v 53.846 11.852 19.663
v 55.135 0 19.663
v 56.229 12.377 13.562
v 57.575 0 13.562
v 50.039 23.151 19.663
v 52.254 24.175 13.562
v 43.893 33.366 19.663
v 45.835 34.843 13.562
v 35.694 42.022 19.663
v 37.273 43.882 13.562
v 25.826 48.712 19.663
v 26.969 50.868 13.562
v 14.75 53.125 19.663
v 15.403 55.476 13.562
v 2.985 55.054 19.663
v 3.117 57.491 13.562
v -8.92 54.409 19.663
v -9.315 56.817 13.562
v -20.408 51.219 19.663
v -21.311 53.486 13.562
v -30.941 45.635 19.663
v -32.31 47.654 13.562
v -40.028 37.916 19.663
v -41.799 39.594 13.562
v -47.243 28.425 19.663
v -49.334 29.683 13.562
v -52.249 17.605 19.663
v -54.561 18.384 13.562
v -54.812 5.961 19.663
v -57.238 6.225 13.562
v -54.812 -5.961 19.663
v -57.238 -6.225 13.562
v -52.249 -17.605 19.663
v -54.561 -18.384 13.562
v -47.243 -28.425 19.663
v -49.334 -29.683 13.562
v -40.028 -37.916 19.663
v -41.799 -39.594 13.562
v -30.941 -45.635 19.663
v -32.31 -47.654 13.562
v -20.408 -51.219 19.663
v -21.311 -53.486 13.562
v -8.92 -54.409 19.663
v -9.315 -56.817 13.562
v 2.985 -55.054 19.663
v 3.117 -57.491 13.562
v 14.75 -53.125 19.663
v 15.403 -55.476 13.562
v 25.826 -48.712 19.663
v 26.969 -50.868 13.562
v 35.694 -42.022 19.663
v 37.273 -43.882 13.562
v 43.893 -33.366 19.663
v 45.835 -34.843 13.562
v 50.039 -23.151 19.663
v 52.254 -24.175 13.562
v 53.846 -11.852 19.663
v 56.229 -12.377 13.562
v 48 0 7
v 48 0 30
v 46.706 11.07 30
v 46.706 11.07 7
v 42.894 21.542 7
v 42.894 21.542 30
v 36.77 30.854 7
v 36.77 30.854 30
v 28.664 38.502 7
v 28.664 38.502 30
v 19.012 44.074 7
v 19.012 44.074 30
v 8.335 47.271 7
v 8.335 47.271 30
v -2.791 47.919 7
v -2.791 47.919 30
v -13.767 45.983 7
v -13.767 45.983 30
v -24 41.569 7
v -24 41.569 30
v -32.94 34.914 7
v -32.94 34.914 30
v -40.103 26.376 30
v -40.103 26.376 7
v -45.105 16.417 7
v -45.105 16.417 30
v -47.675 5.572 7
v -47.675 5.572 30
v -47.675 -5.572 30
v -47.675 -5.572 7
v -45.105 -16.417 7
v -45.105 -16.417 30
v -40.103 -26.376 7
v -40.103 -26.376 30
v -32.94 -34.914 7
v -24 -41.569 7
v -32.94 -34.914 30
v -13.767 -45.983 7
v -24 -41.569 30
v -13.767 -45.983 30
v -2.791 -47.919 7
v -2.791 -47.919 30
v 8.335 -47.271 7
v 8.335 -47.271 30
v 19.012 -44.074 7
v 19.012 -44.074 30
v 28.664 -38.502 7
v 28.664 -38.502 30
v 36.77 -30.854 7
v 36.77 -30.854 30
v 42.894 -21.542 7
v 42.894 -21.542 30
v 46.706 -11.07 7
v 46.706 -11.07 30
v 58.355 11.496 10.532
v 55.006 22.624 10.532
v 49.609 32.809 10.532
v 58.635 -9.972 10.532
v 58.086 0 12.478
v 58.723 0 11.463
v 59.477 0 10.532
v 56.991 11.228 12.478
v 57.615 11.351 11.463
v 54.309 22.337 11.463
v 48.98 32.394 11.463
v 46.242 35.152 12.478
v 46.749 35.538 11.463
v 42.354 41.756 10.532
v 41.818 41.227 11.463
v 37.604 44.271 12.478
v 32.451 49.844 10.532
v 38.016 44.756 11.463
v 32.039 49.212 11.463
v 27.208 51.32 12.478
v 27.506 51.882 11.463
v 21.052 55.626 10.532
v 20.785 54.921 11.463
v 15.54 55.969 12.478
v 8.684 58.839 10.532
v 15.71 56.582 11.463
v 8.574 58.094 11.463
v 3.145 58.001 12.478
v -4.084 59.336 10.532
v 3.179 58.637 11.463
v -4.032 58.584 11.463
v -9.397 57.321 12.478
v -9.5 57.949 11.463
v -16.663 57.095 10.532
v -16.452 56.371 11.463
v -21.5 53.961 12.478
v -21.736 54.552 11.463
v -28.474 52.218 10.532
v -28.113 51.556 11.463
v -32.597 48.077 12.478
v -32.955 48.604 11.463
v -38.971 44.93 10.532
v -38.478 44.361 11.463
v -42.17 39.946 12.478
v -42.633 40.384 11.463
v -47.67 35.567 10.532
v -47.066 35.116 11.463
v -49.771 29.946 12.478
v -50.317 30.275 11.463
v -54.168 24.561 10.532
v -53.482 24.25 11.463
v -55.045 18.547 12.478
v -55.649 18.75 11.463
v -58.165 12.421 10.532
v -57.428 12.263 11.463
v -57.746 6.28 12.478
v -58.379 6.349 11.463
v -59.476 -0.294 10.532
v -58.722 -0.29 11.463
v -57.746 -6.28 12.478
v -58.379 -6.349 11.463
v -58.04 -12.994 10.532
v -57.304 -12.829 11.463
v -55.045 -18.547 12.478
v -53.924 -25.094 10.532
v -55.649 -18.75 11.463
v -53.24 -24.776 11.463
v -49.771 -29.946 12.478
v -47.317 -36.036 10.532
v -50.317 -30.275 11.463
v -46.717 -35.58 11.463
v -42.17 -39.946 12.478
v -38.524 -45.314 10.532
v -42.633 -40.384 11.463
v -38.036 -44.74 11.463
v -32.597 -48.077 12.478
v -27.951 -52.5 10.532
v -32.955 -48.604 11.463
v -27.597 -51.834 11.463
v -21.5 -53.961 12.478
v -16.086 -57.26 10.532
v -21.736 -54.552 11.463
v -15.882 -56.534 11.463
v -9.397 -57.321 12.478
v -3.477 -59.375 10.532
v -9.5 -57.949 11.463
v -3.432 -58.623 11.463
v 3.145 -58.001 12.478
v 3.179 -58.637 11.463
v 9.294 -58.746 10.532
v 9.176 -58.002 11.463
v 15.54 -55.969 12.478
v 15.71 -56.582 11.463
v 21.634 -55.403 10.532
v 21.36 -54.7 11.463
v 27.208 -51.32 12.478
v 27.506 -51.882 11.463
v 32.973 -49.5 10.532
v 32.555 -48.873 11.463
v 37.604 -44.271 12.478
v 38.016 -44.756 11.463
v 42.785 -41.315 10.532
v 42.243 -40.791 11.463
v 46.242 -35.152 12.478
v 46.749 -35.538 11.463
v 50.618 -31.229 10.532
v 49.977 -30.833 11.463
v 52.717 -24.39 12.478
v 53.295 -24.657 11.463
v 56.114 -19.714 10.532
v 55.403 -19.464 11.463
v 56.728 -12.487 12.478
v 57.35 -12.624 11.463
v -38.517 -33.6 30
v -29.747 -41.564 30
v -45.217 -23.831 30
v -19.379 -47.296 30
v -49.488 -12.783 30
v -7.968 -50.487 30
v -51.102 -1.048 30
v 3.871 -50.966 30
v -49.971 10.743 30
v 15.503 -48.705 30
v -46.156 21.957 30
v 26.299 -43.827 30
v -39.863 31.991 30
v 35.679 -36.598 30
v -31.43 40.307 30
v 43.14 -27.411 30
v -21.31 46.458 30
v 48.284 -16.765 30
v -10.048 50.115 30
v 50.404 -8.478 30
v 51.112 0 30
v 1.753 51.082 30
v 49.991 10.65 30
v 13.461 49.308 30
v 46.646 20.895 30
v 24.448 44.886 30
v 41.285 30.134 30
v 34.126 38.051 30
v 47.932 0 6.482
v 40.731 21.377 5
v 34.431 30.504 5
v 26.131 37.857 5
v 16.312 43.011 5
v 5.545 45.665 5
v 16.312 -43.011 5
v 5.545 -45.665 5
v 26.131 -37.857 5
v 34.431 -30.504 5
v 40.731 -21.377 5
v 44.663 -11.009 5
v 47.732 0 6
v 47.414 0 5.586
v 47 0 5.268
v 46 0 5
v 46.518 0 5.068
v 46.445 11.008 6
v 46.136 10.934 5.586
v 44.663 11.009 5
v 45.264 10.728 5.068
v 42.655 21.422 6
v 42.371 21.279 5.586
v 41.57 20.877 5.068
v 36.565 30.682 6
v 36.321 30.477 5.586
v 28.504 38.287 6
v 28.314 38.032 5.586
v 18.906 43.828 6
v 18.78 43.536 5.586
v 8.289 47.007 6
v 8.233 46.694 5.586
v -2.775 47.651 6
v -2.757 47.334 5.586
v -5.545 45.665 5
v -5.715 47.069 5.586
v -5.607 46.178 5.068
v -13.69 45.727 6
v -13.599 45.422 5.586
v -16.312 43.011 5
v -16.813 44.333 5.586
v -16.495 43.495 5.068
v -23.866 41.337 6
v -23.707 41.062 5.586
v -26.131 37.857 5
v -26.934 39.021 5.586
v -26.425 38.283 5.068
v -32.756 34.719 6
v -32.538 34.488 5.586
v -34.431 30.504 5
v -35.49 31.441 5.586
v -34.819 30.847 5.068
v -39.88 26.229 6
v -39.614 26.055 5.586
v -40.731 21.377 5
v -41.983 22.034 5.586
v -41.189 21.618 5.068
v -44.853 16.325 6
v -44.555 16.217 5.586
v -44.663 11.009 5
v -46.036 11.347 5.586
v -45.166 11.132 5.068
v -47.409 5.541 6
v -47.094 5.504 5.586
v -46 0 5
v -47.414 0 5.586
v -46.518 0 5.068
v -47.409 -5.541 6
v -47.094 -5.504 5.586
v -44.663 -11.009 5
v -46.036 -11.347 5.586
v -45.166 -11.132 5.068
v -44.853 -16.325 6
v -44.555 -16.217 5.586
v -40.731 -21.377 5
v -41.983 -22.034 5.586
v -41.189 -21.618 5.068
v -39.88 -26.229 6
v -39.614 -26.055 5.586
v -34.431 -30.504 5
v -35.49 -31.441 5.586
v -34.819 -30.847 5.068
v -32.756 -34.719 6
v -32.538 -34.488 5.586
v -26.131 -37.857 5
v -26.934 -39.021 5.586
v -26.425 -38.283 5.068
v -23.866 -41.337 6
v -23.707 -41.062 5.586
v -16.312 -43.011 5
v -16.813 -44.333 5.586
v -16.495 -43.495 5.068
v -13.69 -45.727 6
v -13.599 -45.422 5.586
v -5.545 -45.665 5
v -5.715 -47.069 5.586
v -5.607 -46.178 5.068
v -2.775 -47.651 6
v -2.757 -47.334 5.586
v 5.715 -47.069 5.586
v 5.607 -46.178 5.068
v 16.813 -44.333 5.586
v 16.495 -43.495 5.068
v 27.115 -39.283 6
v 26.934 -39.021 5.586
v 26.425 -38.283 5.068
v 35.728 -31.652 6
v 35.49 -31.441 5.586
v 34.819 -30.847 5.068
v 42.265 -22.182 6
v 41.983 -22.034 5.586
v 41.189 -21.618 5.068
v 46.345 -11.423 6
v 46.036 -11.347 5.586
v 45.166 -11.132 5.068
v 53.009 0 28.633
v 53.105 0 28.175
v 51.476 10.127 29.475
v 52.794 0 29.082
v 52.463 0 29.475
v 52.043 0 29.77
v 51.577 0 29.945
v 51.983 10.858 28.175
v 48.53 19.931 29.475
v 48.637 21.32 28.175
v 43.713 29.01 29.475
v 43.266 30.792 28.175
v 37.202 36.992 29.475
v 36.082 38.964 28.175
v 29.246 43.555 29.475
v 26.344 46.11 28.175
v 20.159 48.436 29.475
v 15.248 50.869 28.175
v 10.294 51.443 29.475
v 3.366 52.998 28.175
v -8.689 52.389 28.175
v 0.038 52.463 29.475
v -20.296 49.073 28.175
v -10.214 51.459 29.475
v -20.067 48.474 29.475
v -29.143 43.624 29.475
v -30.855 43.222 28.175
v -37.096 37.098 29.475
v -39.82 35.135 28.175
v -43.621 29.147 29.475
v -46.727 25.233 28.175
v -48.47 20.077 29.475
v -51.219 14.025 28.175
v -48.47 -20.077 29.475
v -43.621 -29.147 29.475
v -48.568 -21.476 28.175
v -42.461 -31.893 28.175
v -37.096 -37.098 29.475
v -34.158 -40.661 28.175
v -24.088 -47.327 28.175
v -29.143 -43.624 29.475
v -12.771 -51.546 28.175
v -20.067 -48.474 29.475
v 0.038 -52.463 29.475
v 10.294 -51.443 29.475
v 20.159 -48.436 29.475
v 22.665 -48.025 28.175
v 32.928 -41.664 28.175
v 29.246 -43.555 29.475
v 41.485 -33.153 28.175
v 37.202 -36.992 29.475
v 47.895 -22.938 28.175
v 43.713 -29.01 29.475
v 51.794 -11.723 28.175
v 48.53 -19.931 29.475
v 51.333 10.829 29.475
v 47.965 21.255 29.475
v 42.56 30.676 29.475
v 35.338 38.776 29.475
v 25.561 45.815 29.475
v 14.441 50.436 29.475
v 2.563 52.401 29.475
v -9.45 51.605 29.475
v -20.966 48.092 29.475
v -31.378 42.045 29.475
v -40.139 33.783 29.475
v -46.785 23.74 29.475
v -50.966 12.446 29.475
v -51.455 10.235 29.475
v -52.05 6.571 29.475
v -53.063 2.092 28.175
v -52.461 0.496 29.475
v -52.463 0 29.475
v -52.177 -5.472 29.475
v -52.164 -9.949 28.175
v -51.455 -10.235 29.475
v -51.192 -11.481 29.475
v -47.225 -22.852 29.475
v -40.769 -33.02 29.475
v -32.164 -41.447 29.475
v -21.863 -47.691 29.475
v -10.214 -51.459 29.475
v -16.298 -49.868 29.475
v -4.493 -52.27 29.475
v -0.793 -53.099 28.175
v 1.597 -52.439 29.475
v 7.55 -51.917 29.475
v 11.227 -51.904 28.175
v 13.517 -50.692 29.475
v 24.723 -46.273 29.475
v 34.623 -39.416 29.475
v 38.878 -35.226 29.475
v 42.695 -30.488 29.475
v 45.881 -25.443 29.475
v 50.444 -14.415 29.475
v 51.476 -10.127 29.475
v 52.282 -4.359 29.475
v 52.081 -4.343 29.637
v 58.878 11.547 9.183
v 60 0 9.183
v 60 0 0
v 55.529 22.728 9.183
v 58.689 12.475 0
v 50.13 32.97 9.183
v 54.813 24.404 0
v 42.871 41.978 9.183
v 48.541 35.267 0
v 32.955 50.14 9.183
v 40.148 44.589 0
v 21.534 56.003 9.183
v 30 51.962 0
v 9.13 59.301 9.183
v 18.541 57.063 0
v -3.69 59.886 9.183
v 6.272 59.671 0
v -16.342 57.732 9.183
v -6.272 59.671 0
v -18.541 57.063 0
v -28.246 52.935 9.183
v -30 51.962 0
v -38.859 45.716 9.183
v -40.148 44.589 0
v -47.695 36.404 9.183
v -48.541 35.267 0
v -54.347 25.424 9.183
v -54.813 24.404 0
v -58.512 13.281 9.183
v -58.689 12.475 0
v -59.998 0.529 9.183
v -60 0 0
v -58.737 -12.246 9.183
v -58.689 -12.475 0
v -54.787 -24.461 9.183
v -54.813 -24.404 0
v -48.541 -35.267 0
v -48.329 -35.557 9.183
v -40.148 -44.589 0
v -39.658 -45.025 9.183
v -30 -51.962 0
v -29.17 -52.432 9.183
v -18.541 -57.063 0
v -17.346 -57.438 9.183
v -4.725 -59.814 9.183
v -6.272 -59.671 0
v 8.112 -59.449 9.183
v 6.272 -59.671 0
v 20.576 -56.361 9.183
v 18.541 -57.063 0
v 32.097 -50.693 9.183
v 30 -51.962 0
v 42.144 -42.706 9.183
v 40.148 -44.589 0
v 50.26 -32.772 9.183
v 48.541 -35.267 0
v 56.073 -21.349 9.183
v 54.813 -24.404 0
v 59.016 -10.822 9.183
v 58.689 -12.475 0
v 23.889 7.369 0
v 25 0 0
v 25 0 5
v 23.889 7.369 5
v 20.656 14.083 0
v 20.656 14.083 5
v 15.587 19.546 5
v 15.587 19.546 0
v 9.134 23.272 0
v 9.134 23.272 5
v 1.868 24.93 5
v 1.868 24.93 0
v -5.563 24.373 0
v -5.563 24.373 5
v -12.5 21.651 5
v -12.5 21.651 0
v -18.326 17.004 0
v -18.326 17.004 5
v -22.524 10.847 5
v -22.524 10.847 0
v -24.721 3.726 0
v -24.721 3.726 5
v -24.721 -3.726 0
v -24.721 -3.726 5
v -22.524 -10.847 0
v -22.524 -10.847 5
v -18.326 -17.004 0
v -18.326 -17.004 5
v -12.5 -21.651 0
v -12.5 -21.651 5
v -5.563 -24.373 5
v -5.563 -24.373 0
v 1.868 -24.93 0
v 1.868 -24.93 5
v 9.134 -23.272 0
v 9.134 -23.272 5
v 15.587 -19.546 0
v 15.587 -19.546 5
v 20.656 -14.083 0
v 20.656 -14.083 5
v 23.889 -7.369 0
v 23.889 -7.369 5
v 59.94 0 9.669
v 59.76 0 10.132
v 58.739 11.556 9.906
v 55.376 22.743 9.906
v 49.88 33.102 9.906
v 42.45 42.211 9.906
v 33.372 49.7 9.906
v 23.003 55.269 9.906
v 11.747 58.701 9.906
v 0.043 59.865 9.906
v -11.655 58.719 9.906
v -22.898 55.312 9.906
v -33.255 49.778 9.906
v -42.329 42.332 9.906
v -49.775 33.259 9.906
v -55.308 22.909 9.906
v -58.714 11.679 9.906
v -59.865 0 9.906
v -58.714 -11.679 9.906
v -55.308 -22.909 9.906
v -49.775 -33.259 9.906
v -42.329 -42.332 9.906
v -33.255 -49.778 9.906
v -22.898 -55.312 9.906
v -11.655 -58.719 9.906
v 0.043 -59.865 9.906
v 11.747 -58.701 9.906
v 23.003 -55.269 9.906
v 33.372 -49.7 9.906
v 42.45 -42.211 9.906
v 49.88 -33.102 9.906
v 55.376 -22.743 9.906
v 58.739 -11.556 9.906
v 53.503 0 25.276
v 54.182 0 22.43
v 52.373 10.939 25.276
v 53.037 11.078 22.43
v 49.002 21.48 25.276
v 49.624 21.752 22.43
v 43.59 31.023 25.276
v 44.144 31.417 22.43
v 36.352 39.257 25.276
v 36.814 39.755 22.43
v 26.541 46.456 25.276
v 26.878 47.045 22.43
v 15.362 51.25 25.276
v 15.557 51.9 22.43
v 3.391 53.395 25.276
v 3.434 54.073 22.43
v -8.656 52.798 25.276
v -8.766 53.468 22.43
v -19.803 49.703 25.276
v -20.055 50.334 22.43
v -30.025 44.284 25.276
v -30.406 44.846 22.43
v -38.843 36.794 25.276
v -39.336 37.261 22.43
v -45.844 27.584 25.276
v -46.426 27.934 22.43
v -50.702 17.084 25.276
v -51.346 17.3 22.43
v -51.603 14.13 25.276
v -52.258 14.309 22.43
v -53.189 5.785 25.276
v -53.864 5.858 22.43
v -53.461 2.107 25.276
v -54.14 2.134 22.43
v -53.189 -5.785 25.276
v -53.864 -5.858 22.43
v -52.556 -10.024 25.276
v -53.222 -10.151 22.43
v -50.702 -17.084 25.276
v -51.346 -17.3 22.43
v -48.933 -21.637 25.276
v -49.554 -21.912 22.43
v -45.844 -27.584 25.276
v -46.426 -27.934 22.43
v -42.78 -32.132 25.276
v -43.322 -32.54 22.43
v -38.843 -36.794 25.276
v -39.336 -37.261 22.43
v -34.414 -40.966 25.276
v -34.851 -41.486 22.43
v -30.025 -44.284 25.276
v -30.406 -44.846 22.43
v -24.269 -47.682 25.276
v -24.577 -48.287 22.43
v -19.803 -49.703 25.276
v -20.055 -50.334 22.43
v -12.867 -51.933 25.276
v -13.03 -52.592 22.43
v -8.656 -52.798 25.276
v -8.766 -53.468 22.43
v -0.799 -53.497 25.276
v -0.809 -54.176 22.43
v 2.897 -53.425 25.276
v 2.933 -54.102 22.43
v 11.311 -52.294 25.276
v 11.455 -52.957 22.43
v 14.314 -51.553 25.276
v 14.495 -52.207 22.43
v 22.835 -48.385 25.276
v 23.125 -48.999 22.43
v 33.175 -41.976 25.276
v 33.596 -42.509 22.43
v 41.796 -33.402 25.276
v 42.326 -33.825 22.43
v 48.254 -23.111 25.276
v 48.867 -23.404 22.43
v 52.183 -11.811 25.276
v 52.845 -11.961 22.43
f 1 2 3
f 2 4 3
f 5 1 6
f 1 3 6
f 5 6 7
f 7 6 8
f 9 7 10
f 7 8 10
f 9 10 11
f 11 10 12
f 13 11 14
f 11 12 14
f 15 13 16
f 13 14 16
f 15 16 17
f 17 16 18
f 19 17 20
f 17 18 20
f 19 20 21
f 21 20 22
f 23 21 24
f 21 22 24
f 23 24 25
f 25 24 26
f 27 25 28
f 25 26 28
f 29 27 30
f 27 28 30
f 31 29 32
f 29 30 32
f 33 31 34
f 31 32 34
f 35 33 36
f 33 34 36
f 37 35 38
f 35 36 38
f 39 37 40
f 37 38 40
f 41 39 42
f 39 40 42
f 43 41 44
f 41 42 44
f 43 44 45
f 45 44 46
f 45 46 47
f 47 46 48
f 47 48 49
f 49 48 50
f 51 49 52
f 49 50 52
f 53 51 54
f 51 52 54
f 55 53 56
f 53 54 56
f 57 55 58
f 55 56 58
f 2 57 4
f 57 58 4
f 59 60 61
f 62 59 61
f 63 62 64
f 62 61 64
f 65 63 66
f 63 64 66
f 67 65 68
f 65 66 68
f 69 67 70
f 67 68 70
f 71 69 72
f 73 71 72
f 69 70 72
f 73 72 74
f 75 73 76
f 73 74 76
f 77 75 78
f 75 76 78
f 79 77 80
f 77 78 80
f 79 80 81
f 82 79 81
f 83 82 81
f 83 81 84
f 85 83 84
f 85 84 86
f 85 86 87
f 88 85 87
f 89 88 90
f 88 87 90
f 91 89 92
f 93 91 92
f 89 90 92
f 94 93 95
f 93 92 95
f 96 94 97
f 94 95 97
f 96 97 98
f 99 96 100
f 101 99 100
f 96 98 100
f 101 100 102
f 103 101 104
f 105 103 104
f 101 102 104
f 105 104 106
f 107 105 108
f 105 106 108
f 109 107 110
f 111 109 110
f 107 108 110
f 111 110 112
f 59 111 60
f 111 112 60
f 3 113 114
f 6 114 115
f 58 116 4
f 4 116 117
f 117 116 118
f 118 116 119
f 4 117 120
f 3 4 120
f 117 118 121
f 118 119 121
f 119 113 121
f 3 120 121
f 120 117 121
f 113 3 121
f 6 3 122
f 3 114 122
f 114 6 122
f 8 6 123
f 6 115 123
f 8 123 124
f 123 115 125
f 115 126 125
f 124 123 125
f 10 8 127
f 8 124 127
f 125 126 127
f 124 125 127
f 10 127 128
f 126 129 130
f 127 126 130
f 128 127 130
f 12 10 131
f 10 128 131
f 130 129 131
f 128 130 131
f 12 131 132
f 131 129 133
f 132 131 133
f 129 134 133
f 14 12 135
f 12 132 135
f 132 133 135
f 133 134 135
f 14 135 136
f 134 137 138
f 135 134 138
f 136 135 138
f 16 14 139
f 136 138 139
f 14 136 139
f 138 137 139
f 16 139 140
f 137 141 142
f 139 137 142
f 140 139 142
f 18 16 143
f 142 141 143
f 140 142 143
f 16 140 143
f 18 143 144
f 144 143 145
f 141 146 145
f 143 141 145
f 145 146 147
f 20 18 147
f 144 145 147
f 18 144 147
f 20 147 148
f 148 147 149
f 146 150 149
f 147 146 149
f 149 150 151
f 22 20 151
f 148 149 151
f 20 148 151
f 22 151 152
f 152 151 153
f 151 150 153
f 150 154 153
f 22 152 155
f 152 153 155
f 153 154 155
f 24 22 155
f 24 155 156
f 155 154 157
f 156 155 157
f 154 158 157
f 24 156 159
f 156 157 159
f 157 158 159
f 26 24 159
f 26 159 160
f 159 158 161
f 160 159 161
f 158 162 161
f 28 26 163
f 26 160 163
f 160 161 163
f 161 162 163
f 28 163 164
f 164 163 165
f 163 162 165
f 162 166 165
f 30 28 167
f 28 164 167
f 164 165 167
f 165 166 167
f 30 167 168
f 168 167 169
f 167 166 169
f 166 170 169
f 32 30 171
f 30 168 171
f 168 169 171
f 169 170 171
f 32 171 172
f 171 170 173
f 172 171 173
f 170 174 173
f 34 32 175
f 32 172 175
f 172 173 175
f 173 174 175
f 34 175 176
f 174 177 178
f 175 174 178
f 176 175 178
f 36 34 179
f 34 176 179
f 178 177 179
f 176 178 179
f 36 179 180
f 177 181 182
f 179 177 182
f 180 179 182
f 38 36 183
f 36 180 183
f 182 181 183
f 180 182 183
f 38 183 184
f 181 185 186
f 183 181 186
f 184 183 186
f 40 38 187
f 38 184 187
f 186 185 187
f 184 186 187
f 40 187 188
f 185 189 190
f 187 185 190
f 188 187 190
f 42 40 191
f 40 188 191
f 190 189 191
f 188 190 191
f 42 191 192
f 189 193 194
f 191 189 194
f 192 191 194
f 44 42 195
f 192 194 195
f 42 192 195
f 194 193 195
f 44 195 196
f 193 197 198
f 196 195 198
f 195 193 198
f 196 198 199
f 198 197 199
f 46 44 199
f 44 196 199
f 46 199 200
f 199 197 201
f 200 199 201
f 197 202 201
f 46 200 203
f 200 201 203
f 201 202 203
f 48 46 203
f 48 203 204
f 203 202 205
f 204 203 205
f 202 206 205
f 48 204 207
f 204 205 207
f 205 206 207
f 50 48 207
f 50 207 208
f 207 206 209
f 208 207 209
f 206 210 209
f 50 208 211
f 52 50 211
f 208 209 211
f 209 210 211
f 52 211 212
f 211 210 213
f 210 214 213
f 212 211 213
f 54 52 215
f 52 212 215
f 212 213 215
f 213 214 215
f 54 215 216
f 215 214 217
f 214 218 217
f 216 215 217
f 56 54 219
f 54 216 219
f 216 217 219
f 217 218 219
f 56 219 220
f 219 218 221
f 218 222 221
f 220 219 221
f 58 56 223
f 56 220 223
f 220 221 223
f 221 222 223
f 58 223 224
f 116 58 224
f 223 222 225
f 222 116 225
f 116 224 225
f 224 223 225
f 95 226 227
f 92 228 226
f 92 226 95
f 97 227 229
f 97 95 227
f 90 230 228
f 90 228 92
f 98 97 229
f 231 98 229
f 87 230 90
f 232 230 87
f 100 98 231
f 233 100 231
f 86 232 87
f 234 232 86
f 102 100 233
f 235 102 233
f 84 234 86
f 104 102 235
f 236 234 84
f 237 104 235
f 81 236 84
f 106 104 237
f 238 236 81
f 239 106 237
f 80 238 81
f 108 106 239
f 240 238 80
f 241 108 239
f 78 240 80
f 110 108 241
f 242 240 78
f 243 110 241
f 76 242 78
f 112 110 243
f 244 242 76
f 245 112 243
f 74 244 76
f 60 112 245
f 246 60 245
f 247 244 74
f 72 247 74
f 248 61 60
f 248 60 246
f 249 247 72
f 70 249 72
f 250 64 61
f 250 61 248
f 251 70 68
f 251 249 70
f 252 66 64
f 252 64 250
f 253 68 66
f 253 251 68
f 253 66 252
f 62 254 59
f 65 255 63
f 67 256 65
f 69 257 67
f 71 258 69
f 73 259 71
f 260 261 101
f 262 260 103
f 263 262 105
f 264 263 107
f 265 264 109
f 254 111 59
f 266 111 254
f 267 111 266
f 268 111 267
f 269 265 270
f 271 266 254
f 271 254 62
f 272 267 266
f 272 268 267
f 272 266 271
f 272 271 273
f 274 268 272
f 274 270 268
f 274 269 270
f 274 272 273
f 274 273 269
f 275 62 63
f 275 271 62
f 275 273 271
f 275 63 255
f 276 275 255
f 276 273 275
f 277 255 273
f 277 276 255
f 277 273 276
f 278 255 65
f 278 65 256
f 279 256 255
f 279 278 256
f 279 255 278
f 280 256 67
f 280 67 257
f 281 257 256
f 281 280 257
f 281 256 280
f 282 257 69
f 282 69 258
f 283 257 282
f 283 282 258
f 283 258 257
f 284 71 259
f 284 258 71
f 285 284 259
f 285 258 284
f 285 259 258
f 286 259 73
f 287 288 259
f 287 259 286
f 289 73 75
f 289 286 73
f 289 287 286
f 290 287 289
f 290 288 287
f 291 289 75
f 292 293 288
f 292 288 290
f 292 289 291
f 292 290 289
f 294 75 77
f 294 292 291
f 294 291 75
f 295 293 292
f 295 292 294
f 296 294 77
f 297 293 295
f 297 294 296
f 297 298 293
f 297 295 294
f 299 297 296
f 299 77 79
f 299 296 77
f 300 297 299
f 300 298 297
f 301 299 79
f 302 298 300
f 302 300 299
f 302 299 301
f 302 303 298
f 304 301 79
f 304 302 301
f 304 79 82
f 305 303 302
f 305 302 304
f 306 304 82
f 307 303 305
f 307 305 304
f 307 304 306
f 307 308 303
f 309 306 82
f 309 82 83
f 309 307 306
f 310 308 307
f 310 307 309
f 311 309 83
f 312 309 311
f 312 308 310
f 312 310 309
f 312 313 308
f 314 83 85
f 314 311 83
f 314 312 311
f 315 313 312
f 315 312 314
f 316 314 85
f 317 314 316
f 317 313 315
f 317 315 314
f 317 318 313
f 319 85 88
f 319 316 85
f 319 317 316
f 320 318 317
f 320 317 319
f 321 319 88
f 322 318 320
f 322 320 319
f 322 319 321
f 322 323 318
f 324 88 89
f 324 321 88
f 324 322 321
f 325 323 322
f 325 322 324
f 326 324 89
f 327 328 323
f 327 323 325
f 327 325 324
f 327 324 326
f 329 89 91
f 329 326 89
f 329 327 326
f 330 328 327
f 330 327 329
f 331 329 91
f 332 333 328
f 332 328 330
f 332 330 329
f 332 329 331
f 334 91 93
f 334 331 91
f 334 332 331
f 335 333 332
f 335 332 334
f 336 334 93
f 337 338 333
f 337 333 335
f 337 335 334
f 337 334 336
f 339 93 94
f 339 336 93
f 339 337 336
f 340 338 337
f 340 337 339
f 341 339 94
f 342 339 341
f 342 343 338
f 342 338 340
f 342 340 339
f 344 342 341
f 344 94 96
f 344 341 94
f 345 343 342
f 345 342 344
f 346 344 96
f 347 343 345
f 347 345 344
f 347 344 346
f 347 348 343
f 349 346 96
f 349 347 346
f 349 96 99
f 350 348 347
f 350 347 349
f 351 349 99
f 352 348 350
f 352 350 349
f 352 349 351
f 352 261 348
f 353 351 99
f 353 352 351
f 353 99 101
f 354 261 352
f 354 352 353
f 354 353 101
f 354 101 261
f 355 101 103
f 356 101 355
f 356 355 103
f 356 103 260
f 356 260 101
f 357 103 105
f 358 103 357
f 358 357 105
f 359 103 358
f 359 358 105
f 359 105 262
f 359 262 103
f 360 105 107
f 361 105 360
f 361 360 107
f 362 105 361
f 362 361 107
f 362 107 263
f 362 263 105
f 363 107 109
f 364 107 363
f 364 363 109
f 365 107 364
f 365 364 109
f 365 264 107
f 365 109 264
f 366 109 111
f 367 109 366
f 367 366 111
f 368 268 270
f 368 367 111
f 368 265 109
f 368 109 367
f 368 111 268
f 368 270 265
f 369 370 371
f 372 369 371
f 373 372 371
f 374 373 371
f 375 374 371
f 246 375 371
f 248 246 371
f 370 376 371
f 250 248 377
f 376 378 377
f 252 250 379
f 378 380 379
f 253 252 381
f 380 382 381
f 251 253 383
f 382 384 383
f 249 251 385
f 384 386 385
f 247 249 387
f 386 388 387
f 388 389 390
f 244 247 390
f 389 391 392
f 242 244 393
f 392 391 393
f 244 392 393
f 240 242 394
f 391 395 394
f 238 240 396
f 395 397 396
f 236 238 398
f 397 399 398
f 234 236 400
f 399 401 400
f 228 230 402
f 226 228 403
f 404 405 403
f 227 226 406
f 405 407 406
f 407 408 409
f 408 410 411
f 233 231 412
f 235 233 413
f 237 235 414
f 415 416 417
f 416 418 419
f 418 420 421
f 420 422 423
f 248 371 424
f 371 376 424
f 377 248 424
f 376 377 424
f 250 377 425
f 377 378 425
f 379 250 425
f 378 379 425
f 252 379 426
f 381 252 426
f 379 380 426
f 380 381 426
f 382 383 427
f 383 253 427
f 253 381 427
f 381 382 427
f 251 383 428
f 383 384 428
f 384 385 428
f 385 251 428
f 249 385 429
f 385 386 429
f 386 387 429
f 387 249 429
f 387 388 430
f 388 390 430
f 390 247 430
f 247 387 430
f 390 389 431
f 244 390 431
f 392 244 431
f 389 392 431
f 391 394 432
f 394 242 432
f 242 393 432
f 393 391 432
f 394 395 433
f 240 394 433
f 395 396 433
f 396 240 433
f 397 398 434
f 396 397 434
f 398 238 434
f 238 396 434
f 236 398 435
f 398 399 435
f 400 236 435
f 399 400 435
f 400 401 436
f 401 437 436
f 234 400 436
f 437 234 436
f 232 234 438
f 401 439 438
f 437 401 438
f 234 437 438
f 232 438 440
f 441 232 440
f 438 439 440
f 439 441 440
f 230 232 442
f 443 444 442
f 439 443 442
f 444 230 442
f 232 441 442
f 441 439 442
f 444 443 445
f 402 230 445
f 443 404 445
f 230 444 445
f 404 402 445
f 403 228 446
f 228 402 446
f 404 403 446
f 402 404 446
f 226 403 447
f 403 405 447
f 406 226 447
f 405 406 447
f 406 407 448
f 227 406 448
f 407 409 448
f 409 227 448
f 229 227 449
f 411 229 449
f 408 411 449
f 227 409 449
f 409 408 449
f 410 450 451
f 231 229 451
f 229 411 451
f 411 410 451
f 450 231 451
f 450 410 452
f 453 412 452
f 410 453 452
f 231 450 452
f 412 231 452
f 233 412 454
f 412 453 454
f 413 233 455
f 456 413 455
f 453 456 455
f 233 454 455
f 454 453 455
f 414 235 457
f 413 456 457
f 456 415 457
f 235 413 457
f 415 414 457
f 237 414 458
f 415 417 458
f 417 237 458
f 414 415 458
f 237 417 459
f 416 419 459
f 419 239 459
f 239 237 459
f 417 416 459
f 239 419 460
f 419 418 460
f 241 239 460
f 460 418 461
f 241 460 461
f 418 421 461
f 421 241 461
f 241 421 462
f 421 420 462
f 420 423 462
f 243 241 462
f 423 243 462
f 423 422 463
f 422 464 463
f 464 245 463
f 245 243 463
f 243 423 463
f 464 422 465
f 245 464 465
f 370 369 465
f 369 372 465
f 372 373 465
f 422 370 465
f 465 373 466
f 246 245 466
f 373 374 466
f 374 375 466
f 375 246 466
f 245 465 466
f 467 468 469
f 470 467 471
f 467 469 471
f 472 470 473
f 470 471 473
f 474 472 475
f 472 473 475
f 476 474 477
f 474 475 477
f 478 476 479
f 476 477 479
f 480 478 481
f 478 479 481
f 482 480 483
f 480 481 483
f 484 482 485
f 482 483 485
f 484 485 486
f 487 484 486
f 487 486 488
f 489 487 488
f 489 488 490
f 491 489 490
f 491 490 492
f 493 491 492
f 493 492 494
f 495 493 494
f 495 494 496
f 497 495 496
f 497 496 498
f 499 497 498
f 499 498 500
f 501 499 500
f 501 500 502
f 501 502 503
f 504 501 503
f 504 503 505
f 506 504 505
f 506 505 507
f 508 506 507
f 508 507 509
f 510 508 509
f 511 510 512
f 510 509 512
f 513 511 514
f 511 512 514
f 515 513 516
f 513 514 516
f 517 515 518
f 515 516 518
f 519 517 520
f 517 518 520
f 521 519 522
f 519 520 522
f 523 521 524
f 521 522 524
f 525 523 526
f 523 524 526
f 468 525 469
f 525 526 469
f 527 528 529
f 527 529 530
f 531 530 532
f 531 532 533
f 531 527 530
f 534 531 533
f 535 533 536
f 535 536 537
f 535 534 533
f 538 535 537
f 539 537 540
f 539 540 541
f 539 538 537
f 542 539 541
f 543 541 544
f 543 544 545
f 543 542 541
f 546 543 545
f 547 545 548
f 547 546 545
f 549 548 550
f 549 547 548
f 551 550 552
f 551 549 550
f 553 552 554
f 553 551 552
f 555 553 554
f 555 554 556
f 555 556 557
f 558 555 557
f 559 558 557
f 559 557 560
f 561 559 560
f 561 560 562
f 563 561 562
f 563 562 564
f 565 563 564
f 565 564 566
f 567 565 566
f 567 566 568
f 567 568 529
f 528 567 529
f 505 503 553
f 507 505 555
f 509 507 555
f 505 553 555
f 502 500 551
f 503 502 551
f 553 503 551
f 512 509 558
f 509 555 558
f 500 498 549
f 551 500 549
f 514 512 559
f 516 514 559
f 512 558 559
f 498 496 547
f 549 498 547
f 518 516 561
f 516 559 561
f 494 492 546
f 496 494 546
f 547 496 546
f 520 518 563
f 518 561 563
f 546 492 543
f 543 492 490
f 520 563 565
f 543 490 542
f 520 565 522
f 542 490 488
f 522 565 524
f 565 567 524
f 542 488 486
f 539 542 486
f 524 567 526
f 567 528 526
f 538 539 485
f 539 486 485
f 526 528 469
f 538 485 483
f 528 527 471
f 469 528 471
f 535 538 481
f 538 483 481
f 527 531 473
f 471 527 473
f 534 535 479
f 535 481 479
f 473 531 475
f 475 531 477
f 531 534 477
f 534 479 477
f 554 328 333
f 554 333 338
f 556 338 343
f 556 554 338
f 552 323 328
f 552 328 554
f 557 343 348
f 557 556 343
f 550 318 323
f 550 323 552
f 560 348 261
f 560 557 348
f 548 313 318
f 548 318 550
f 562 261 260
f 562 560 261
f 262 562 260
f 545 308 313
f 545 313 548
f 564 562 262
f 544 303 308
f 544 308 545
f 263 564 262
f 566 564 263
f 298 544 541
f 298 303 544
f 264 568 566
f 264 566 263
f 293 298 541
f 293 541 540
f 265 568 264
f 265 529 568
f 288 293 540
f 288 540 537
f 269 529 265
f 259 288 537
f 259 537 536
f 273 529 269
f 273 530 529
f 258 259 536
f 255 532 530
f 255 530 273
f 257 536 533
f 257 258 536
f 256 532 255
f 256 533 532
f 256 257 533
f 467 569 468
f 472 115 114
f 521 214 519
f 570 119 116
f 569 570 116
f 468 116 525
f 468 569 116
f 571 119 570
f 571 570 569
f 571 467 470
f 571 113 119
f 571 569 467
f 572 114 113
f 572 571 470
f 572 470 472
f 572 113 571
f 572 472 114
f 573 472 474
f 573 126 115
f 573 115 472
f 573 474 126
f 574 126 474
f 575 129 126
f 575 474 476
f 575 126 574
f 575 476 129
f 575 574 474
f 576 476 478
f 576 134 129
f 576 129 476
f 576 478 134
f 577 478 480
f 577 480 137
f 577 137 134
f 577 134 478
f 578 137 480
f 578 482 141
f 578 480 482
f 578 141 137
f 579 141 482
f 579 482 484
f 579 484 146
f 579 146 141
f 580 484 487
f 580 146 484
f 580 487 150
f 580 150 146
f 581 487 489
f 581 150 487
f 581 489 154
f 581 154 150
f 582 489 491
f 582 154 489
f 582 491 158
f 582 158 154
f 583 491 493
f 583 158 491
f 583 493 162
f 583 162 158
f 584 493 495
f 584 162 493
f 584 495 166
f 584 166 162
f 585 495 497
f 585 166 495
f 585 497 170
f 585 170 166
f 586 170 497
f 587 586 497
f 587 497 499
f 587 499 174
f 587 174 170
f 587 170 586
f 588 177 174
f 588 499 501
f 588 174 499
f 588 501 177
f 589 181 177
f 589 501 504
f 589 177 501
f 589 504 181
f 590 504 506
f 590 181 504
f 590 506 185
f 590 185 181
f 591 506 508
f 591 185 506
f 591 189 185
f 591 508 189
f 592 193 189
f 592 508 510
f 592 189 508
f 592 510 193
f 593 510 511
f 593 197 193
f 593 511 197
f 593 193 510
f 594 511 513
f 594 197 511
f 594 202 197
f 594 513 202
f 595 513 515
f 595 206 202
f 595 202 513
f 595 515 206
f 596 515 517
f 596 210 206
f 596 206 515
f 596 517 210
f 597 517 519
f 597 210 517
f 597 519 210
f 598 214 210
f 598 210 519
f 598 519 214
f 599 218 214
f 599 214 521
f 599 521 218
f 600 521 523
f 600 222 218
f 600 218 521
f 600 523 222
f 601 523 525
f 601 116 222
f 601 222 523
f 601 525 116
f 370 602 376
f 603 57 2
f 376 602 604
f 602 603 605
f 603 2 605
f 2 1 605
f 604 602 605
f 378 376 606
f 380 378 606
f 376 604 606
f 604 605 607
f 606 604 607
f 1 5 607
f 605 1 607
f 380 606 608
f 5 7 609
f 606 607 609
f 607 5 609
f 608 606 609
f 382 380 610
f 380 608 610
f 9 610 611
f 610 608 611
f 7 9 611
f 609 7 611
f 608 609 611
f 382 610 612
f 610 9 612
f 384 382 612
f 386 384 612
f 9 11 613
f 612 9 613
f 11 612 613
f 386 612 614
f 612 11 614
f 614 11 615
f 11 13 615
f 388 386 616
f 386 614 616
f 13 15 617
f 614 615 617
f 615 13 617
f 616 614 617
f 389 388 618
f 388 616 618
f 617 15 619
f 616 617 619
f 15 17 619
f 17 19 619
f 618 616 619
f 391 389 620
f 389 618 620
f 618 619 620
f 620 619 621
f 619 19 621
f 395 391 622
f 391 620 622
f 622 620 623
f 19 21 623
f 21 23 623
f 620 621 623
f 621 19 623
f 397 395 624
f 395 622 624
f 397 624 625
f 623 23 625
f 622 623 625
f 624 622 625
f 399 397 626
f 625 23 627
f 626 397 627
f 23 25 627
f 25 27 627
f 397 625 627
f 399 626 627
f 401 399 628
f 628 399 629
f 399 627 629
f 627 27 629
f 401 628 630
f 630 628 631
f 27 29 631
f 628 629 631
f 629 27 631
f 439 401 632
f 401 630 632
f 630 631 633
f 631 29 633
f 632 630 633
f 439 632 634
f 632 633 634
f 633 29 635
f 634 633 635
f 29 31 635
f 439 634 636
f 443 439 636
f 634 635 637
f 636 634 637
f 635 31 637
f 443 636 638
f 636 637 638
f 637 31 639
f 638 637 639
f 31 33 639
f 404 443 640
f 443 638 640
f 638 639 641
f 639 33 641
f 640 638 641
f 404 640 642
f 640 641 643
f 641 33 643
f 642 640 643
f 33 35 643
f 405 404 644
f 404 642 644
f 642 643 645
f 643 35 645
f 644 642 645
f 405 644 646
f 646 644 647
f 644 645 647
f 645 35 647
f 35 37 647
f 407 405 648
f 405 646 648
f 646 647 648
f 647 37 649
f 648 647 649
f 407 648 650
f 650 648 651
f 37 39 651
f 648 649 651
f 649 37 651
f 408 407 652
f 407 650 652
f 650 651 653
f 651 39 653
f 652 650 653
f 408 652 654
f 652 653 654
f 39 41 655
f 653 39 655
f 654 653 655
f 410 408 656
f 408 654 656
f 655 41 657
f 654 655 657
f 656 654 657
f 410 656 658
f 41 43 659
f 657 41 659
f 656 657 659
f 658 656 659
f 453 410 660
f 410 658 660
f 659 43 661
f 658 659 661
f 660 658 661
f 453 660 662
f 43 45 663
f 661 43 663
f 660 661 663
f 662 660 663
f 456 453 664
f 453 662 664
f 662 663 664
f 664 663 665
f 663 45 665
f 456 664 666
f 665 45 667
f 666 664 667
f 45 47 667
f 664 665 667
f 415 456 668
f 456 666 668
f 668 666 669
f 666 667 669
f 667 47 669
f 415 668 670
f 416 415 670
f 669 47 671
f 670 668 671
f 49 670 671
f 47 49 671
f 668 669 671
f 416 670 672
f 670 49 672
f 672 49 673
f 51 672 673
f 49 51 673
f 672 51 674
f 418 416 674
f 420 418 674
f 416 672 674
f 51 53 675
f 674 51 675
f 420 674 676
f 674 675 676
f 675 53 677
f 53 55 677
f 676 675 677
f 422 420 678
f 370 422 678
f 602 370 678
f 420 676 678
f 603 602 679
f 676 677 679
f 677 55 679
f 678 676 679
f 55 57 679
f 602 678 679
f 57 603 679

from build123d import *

# Parameters (mm, degrees)
F0_R     = 60
F0_R_2   = 25
F1_DEPTH = 30
F2_R     = 48
F2_R_2   = 25
F3_DEPTH = 25
F4_R     = 2
F5_R     = 60
F5_R_2   = 53
F6_DEPTH = 20
F7_SIZE2 = 6
F7_SIZE  = 15
F10_R    = 2
F11_R    = 2


# Not quite as in the source:
# - a fillet or chamfer that OpenCascade refuses, or shapes differently, is made with other operations: its cross-section is extruded or revolved along the edge and cut away or added


with BuildPart() as f1:
    # F0 (on Top) → F1 (new body)
    with BuildSketch(Plane.XY):
        Circle(F0_R)
        Circle(F0_R_2, mode=Mode.SUBTRACT)
    extrude(amount=F1_DEPTH)

    # F2 (on face) → F3 (cut)
    with BuildSketch(Plane.XY.offset(30)):
        Circle(F2_R)
        Circle(F2_R_2, mode=Mode.SUBTRACT)
    extrude(amount=-F3_DEPTH, mode=Mode.SUBTRACT)

    # F4
    f4_edges = [f1.edges().sort_by_distance(p)[0] for p in [
        (-48, 0, 5),
    ]]
    fillet(f4_edges, radius=F4_R)

    # F5 (on face) → F6 (cut)
    with BuildSketch(Plane.XY.offset(30)):
        Circle(F5_R)
        Circle(F5_R_2, mode=Mode.SUBTRACT)
    extrude(amount=-F6_DEPTH, mode=Mode.SUBTRACT)

    # F7
    f7_edges = [f1.edges().sort_by_distance(p)[0] for p in [
        (-53, 0, 10),
    ]]
    chamfer(f7_edges, length=F7_SIZE, length2=F7_SIZE2)

    # F8: fillet of radius 10 on 1 edges, made by hand

    # F8_s1 → F8_t2 (revolve)
    with BuildSketch(Plane.XZ):
        with BuildLine():
            ThreePointArc((57.575110205, 13.5622244876), (58.5933939753, 11.6489422086), (60, 10))
            Line((60, 10), (59, 10))
            Line((59, 10), (57.575110205, 13.5622244876))
        make_face()
    revolve(axis=Axis((0, 0, 10), (0, 0, 1)))

    # F9: fillet of radius 30 on 1 edges, made by hand

    # F9_s1 → F9_t2 (revolve)
    with BuildSketch(Plane.XZ):
        with BuildLine():
            ThreePointArc((53, 30), (53.6092390565, 24.7367266148), (55.134911926, 19.662720185))
            Line((55.134911926, 19.662720185), (53, 25))
            Line((53, 25), (53, 30))
        make_face()
    revolve(axis=Axis((0, 0, 25), (0, 0, 1)))

    # F10
    f10_edges = [f1.edges().sort_by_distance(p)[0] for p in [
        (-60, 0, 10),
    ]]
    fillet(f10_edges, radius=F10_R)

    # F11
    f11_edges = [f1.edges().sort_by_distance(p)[0] for p in [
        (-53, 0, 30),
    ]]
    fillet(f11_edges, radius=F11_R)


solid = f1.part
